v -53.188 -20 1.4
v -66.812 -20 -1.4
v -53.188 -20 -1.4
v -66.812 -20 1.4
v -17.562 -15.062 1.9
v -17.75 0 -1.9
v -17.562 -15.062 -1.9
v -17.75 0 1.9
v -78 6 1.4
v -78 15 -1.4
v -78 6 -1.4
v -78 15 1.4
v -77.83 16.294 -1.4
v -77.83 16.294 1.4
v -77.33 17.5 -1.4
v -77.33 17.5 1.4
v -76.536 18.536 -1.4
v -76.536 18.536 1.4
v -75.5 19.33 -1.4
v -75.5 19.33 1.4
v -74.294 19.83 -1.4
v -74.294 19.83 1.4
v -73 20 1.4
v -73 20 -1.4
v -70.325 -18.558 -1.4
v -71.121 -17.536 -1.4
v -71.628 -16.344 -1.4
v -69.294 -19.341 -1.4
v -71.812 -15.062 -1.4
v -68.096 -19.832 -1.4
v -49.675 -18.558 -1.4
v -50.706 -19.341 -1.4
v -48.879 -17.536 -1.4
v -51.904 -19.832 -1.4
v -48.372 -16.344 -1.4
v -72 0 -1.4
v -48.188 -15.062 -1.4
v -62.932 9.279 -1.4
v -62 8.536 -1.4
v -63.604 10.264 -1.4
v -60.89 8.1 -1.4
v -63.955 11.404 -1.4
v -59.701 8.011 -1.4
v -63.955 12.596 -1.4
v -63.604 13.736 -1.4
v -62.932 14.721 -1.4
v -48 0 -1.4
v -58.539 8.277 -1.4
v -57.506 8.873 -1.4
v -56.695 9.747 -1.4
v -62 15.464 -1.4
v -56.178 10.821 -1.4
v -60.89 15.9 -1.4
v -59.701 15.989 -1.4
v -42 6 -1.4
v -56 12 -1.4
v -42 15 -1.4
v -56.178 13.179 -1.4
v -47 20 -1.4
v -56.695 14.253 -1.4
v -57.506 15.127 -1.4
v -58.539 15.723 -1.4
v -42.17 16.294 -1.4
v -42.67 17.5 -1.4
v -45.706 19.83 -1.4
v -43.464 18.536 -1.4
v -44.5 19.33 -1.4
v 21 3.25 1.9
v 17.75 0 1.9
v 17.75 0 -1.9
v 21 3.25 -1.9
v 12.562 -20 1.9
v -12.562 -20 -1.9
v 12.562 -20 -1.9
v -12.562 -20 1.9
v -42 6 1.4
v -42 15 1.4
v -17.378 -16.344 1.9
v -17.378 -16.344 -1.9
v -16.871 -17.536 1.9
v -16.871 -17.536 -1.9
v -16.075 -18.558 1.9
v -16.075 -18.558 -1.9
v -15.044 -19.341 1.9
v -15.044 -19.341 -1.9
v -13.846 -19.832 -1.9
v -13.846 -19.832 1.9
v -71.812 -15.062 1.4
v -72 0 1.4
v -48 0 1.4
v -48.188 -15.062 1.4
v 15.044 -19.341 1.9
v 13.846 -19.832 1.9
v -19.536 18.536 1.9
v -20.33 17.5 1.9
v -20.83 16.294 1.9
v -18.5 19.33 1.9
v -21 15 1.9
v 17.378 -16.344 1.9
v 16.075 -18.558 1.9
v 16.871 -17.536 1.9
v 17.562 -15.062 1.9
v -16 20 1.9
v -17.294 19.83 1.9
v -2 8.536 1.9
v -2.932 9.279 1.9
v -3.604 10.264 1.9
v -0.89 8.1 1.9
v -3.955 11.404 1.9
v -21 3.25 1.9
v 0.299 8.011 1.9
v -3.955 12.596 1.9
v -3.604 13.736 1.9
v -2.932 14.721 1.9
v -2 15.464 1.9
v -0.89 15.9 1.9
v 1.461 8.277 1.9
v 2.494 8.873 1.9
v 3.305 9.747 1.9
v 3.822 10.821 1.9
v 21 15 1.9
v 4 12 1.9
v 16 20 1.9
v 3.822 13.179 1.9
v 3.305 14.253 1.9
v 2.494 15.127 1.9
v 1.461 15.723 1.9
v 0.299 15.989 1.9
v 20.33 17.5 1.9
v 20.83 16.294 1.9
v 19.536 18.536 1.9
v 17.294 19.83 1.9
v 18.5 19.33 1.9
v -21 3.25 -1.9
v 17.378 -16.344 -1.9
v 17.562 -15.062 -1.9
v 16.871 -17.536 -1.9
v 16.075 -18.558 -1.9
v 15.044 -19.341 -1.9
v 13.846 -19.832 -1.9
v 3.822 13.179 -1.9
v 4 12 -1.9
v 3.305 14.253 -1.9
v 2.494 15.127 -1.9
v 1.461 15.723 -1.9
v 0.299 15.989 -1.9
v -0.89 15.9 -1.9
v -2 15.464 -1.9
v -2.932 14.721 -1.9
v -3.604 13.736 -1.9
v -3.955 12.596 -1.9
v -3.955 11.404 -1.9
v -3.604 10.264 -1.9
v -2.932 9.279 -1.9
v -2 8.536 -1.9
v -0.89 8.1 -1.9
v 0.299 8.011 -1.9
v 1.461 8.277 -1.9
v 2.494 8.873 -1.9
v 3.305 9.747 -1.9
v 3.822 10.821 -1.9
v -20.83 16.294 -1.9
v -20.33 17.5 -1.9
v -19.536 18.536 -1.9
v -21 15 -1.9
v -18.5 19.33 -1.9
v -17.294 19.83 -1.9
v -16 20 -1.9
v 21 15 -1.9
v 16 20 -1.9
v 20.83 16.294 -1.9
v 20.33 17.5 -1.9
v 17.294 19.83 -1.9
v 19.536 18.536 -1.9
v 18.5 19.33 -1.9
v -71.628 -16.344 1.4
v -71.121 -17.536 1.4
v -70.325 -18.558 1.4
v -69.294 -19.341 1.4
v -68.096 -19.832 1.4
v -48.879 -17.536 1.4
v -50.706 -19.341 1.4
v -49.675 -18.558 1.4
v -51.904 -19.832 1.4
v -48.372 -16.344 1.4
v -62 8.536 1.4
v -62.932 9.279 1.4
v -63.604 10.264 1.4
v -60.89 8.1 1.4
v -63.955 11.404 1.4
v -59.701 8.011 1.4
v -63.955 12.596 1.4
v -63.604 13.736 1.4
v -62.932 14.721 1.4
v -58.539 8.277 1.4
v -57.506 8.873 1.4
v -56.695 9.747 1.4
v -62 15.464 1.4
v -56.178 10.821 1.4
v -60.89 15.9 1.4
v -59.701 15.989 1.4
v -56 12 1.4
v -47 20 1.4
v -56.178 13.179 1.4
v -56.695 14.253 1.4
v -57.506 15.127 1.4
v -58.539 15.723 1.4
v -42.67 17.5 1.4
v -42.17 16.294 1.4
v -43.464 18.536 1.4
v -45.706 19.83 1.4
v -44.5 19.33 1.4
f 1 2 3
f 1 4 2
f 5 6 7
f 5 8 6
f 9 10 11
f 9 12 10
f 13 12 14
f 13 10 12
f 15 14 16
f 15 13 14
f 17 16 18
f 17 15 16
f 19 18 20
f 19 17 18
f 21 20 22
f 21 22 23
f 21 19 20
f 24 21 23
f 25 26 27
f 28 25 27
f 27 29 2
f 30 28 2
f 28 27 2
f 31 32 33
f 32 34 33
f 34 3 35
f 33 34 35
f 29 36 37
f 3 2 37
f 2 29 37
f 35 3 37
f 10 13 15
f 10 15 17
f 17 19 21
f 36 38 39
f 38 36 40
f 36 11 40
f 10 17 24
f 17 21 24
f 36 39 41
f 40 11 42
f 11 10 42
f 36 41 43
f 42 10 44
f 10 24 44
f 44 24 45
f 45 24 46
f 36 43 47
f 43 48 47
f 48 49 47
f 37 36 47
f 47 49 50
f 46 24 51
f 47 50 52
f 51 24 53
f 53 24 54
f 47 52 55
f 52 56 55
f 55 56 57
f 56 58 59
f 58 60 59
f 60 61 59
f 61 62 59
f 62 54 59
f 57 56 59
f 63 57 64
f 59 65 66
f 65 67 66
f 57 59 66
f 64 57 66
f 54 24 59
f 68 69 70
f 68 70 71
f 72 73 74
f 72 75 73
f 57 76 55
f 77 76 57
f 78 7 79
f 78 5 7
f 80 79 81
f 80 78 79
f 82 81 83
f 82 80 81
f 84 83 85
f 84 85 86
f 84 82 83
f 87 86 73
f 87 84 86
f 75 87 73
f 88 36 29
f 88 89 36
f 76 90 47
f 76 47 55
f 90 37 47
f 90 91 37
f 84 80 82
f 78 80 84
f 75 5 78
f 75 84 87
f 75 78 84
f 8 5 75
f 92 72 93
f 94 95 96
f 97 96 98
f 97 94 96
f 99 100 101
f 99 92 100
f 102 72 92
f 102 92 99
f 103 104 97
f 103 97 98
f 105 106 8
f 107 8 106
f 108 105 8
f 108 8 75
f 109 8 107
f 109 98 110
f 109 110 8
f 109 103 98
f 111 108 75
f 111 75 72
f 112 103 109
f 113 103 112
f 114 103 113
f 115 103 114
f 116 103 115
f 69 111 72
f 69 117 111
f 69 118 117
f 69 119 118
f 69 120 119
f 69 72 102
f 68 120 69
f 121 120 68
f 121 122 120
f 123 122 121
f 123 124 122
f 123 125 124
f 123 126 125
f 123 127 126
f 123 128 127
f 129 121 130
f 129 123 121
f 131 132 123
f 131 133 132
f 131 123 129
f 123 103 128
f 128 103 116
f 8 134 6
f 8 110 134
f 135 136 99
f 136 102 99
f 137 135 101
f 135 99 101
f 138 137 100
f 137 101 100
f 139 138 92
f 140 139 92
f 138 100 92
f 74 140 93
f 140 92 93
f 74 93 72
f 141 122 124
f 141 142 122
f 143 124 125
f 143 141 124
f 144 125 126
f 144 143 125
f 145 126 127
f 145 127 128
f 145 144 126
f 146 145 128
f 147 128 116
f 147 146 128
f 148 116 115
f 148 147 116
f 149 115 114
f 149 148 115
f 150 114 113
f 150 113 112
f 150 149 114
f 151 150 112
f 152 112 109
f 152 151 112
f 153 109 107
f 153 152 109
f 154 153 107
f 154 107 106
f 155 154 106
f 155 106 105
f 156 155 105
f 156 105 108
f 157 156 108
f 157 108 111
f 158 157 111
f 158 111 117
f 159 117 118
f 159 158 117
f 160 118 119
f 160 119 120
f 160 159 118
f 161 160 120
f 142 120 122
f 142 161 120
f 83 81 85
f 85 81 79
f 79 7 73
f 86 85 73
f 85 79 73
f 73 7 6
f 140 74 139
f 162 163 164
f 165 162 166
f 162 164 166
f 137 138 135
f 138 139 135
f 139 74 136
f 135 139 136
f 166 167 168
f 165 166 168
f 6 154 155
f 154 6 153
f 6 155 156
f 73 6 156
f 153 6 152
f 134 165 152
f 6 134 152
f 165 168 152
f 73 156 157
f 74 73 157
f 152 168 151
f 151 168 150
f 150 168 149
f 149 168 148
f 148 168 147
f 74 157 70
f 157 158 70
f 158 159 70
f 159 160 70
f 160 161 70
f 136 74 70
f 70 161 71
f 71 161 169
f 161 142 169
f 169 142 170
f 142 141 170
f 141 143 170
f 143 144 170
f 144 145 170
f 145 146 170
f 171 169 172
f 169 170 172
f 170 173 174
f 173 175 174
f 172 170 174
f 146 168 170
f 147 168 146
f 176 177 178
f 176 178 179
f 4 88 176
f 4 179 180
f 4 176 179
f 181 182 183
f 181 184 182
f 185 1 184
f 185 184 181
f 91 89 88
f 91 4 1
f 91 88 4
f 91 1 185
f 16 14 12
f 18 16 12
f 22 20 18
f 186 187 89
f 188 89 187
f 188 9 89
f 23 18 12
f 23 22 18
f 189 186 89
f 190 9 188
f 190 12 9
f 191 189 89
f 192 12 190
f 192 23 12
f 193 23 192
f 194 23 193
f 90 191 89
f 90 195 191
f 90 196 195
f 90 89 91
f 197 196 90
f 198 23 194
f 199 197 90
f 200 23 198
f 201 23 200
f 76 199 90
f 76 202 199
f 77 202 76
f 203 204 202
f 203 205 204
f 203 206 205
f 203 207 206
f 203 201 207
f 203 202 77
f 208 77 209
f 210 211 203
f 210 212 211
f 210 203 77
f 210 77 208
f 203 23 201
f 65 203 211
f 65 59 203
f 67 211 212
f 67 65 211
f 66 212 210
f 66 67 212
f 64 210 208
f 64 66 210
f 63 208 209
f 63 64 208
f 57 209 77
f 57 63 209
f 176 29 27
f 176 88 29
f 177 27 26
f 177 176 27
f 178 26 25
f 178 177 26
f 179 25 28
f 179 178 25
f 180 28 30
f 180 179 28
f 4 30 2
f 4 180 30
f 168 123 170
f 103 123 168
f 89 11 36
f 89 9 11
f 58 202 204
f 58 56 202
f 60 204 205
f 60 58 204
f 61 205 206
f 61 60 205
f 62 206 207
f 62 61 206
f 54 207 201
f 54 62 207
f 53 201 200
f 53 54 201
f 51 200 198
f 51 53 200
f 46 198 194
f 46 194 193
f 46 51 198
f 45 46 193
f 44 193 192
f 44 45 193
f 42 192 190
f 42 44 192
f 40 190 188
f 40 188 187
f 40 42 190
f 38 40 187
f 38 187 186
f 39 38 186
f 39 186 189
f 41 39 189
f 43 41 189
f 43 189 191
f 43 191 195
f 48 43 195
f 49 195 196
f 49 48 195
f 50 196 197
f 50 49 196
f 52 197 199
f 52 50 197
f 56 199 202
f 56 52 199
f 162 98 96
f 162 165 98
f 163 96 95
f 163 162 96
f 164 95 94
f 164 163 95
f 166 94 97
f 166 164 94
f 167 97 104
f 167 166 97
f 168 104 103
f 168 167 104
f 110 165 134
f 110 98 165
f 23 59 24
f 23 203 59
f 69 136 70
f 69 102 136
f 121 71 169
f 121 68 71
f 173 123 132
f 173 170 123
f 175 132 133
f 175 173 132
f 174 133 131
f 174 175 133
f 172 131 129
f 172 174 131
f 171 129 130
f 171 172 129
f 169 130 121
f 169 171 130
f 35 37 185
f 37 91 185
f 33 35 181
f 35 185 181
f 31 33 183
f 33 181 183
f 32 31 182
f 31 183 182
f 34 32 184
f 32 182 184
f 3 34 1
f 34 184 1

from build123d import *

# Parameters (mm, degrees)
F0_R     = 4
F1_DEPTH = 1.9
F2_R     = 4
F3_DEPTH = 1.4
F4_R     = 5
F4_2_R   = 5


with BuildPart() as f1:
    # F0 (on Top) → F1 (new body, symmetric)
    with BuildSketch(Plane.XY):
        Polygon((-17.75, 0), (-17.5, -20), (17.5, -20), (17.75, 0), (21, 3.25), (21, 20), (-21, 20), (-21, 3.25), align=None)
        with Locations((0, 12)):
            Circle(F0_R, mode=Mode.SUBTRACT)
    extrude(amount=F1_DEPTH, both=True)

    # F4
    f4_edges = [f1.edges().sort_by_distance(p)[0] for p in [
        (-21, 20, 0),
        (21, 20, 0),
        (17.5, -20, 0),
        (-17.5, -20, 0),
    ]]
    fillet(f4_edges, radius=F4_R)


with BuildPart() as f3:
    # F2 (on Top) → F3 (new body, symmetric)
    with BuildSketch(Plane.XY):
        Polygon((-72, 0), (-71.75, -20), (-48.25, -20), (-48, 0), (-42, 6), (-42, 20), (-78, 20), (-78, 6), align=None)
        with Locations((-60, 12)):
            Circle(F2_R, mode=Mode.SUBTRACT)
    extrude(amount=F3_DEPTH, both=True)

    # F4#2
    f4_2_edges = [f3.edges().sort_by_distance(p)[0] for p in [
        (-71.75, -20, 0),
        (-48.25, -20, 0),
        (-42, 20, 0),
        (-78, 20, 0),
    ]]
    fillet(f4_2_edges, radius=F4_2_R)


solid = Compound([f1.part, f3.part])
